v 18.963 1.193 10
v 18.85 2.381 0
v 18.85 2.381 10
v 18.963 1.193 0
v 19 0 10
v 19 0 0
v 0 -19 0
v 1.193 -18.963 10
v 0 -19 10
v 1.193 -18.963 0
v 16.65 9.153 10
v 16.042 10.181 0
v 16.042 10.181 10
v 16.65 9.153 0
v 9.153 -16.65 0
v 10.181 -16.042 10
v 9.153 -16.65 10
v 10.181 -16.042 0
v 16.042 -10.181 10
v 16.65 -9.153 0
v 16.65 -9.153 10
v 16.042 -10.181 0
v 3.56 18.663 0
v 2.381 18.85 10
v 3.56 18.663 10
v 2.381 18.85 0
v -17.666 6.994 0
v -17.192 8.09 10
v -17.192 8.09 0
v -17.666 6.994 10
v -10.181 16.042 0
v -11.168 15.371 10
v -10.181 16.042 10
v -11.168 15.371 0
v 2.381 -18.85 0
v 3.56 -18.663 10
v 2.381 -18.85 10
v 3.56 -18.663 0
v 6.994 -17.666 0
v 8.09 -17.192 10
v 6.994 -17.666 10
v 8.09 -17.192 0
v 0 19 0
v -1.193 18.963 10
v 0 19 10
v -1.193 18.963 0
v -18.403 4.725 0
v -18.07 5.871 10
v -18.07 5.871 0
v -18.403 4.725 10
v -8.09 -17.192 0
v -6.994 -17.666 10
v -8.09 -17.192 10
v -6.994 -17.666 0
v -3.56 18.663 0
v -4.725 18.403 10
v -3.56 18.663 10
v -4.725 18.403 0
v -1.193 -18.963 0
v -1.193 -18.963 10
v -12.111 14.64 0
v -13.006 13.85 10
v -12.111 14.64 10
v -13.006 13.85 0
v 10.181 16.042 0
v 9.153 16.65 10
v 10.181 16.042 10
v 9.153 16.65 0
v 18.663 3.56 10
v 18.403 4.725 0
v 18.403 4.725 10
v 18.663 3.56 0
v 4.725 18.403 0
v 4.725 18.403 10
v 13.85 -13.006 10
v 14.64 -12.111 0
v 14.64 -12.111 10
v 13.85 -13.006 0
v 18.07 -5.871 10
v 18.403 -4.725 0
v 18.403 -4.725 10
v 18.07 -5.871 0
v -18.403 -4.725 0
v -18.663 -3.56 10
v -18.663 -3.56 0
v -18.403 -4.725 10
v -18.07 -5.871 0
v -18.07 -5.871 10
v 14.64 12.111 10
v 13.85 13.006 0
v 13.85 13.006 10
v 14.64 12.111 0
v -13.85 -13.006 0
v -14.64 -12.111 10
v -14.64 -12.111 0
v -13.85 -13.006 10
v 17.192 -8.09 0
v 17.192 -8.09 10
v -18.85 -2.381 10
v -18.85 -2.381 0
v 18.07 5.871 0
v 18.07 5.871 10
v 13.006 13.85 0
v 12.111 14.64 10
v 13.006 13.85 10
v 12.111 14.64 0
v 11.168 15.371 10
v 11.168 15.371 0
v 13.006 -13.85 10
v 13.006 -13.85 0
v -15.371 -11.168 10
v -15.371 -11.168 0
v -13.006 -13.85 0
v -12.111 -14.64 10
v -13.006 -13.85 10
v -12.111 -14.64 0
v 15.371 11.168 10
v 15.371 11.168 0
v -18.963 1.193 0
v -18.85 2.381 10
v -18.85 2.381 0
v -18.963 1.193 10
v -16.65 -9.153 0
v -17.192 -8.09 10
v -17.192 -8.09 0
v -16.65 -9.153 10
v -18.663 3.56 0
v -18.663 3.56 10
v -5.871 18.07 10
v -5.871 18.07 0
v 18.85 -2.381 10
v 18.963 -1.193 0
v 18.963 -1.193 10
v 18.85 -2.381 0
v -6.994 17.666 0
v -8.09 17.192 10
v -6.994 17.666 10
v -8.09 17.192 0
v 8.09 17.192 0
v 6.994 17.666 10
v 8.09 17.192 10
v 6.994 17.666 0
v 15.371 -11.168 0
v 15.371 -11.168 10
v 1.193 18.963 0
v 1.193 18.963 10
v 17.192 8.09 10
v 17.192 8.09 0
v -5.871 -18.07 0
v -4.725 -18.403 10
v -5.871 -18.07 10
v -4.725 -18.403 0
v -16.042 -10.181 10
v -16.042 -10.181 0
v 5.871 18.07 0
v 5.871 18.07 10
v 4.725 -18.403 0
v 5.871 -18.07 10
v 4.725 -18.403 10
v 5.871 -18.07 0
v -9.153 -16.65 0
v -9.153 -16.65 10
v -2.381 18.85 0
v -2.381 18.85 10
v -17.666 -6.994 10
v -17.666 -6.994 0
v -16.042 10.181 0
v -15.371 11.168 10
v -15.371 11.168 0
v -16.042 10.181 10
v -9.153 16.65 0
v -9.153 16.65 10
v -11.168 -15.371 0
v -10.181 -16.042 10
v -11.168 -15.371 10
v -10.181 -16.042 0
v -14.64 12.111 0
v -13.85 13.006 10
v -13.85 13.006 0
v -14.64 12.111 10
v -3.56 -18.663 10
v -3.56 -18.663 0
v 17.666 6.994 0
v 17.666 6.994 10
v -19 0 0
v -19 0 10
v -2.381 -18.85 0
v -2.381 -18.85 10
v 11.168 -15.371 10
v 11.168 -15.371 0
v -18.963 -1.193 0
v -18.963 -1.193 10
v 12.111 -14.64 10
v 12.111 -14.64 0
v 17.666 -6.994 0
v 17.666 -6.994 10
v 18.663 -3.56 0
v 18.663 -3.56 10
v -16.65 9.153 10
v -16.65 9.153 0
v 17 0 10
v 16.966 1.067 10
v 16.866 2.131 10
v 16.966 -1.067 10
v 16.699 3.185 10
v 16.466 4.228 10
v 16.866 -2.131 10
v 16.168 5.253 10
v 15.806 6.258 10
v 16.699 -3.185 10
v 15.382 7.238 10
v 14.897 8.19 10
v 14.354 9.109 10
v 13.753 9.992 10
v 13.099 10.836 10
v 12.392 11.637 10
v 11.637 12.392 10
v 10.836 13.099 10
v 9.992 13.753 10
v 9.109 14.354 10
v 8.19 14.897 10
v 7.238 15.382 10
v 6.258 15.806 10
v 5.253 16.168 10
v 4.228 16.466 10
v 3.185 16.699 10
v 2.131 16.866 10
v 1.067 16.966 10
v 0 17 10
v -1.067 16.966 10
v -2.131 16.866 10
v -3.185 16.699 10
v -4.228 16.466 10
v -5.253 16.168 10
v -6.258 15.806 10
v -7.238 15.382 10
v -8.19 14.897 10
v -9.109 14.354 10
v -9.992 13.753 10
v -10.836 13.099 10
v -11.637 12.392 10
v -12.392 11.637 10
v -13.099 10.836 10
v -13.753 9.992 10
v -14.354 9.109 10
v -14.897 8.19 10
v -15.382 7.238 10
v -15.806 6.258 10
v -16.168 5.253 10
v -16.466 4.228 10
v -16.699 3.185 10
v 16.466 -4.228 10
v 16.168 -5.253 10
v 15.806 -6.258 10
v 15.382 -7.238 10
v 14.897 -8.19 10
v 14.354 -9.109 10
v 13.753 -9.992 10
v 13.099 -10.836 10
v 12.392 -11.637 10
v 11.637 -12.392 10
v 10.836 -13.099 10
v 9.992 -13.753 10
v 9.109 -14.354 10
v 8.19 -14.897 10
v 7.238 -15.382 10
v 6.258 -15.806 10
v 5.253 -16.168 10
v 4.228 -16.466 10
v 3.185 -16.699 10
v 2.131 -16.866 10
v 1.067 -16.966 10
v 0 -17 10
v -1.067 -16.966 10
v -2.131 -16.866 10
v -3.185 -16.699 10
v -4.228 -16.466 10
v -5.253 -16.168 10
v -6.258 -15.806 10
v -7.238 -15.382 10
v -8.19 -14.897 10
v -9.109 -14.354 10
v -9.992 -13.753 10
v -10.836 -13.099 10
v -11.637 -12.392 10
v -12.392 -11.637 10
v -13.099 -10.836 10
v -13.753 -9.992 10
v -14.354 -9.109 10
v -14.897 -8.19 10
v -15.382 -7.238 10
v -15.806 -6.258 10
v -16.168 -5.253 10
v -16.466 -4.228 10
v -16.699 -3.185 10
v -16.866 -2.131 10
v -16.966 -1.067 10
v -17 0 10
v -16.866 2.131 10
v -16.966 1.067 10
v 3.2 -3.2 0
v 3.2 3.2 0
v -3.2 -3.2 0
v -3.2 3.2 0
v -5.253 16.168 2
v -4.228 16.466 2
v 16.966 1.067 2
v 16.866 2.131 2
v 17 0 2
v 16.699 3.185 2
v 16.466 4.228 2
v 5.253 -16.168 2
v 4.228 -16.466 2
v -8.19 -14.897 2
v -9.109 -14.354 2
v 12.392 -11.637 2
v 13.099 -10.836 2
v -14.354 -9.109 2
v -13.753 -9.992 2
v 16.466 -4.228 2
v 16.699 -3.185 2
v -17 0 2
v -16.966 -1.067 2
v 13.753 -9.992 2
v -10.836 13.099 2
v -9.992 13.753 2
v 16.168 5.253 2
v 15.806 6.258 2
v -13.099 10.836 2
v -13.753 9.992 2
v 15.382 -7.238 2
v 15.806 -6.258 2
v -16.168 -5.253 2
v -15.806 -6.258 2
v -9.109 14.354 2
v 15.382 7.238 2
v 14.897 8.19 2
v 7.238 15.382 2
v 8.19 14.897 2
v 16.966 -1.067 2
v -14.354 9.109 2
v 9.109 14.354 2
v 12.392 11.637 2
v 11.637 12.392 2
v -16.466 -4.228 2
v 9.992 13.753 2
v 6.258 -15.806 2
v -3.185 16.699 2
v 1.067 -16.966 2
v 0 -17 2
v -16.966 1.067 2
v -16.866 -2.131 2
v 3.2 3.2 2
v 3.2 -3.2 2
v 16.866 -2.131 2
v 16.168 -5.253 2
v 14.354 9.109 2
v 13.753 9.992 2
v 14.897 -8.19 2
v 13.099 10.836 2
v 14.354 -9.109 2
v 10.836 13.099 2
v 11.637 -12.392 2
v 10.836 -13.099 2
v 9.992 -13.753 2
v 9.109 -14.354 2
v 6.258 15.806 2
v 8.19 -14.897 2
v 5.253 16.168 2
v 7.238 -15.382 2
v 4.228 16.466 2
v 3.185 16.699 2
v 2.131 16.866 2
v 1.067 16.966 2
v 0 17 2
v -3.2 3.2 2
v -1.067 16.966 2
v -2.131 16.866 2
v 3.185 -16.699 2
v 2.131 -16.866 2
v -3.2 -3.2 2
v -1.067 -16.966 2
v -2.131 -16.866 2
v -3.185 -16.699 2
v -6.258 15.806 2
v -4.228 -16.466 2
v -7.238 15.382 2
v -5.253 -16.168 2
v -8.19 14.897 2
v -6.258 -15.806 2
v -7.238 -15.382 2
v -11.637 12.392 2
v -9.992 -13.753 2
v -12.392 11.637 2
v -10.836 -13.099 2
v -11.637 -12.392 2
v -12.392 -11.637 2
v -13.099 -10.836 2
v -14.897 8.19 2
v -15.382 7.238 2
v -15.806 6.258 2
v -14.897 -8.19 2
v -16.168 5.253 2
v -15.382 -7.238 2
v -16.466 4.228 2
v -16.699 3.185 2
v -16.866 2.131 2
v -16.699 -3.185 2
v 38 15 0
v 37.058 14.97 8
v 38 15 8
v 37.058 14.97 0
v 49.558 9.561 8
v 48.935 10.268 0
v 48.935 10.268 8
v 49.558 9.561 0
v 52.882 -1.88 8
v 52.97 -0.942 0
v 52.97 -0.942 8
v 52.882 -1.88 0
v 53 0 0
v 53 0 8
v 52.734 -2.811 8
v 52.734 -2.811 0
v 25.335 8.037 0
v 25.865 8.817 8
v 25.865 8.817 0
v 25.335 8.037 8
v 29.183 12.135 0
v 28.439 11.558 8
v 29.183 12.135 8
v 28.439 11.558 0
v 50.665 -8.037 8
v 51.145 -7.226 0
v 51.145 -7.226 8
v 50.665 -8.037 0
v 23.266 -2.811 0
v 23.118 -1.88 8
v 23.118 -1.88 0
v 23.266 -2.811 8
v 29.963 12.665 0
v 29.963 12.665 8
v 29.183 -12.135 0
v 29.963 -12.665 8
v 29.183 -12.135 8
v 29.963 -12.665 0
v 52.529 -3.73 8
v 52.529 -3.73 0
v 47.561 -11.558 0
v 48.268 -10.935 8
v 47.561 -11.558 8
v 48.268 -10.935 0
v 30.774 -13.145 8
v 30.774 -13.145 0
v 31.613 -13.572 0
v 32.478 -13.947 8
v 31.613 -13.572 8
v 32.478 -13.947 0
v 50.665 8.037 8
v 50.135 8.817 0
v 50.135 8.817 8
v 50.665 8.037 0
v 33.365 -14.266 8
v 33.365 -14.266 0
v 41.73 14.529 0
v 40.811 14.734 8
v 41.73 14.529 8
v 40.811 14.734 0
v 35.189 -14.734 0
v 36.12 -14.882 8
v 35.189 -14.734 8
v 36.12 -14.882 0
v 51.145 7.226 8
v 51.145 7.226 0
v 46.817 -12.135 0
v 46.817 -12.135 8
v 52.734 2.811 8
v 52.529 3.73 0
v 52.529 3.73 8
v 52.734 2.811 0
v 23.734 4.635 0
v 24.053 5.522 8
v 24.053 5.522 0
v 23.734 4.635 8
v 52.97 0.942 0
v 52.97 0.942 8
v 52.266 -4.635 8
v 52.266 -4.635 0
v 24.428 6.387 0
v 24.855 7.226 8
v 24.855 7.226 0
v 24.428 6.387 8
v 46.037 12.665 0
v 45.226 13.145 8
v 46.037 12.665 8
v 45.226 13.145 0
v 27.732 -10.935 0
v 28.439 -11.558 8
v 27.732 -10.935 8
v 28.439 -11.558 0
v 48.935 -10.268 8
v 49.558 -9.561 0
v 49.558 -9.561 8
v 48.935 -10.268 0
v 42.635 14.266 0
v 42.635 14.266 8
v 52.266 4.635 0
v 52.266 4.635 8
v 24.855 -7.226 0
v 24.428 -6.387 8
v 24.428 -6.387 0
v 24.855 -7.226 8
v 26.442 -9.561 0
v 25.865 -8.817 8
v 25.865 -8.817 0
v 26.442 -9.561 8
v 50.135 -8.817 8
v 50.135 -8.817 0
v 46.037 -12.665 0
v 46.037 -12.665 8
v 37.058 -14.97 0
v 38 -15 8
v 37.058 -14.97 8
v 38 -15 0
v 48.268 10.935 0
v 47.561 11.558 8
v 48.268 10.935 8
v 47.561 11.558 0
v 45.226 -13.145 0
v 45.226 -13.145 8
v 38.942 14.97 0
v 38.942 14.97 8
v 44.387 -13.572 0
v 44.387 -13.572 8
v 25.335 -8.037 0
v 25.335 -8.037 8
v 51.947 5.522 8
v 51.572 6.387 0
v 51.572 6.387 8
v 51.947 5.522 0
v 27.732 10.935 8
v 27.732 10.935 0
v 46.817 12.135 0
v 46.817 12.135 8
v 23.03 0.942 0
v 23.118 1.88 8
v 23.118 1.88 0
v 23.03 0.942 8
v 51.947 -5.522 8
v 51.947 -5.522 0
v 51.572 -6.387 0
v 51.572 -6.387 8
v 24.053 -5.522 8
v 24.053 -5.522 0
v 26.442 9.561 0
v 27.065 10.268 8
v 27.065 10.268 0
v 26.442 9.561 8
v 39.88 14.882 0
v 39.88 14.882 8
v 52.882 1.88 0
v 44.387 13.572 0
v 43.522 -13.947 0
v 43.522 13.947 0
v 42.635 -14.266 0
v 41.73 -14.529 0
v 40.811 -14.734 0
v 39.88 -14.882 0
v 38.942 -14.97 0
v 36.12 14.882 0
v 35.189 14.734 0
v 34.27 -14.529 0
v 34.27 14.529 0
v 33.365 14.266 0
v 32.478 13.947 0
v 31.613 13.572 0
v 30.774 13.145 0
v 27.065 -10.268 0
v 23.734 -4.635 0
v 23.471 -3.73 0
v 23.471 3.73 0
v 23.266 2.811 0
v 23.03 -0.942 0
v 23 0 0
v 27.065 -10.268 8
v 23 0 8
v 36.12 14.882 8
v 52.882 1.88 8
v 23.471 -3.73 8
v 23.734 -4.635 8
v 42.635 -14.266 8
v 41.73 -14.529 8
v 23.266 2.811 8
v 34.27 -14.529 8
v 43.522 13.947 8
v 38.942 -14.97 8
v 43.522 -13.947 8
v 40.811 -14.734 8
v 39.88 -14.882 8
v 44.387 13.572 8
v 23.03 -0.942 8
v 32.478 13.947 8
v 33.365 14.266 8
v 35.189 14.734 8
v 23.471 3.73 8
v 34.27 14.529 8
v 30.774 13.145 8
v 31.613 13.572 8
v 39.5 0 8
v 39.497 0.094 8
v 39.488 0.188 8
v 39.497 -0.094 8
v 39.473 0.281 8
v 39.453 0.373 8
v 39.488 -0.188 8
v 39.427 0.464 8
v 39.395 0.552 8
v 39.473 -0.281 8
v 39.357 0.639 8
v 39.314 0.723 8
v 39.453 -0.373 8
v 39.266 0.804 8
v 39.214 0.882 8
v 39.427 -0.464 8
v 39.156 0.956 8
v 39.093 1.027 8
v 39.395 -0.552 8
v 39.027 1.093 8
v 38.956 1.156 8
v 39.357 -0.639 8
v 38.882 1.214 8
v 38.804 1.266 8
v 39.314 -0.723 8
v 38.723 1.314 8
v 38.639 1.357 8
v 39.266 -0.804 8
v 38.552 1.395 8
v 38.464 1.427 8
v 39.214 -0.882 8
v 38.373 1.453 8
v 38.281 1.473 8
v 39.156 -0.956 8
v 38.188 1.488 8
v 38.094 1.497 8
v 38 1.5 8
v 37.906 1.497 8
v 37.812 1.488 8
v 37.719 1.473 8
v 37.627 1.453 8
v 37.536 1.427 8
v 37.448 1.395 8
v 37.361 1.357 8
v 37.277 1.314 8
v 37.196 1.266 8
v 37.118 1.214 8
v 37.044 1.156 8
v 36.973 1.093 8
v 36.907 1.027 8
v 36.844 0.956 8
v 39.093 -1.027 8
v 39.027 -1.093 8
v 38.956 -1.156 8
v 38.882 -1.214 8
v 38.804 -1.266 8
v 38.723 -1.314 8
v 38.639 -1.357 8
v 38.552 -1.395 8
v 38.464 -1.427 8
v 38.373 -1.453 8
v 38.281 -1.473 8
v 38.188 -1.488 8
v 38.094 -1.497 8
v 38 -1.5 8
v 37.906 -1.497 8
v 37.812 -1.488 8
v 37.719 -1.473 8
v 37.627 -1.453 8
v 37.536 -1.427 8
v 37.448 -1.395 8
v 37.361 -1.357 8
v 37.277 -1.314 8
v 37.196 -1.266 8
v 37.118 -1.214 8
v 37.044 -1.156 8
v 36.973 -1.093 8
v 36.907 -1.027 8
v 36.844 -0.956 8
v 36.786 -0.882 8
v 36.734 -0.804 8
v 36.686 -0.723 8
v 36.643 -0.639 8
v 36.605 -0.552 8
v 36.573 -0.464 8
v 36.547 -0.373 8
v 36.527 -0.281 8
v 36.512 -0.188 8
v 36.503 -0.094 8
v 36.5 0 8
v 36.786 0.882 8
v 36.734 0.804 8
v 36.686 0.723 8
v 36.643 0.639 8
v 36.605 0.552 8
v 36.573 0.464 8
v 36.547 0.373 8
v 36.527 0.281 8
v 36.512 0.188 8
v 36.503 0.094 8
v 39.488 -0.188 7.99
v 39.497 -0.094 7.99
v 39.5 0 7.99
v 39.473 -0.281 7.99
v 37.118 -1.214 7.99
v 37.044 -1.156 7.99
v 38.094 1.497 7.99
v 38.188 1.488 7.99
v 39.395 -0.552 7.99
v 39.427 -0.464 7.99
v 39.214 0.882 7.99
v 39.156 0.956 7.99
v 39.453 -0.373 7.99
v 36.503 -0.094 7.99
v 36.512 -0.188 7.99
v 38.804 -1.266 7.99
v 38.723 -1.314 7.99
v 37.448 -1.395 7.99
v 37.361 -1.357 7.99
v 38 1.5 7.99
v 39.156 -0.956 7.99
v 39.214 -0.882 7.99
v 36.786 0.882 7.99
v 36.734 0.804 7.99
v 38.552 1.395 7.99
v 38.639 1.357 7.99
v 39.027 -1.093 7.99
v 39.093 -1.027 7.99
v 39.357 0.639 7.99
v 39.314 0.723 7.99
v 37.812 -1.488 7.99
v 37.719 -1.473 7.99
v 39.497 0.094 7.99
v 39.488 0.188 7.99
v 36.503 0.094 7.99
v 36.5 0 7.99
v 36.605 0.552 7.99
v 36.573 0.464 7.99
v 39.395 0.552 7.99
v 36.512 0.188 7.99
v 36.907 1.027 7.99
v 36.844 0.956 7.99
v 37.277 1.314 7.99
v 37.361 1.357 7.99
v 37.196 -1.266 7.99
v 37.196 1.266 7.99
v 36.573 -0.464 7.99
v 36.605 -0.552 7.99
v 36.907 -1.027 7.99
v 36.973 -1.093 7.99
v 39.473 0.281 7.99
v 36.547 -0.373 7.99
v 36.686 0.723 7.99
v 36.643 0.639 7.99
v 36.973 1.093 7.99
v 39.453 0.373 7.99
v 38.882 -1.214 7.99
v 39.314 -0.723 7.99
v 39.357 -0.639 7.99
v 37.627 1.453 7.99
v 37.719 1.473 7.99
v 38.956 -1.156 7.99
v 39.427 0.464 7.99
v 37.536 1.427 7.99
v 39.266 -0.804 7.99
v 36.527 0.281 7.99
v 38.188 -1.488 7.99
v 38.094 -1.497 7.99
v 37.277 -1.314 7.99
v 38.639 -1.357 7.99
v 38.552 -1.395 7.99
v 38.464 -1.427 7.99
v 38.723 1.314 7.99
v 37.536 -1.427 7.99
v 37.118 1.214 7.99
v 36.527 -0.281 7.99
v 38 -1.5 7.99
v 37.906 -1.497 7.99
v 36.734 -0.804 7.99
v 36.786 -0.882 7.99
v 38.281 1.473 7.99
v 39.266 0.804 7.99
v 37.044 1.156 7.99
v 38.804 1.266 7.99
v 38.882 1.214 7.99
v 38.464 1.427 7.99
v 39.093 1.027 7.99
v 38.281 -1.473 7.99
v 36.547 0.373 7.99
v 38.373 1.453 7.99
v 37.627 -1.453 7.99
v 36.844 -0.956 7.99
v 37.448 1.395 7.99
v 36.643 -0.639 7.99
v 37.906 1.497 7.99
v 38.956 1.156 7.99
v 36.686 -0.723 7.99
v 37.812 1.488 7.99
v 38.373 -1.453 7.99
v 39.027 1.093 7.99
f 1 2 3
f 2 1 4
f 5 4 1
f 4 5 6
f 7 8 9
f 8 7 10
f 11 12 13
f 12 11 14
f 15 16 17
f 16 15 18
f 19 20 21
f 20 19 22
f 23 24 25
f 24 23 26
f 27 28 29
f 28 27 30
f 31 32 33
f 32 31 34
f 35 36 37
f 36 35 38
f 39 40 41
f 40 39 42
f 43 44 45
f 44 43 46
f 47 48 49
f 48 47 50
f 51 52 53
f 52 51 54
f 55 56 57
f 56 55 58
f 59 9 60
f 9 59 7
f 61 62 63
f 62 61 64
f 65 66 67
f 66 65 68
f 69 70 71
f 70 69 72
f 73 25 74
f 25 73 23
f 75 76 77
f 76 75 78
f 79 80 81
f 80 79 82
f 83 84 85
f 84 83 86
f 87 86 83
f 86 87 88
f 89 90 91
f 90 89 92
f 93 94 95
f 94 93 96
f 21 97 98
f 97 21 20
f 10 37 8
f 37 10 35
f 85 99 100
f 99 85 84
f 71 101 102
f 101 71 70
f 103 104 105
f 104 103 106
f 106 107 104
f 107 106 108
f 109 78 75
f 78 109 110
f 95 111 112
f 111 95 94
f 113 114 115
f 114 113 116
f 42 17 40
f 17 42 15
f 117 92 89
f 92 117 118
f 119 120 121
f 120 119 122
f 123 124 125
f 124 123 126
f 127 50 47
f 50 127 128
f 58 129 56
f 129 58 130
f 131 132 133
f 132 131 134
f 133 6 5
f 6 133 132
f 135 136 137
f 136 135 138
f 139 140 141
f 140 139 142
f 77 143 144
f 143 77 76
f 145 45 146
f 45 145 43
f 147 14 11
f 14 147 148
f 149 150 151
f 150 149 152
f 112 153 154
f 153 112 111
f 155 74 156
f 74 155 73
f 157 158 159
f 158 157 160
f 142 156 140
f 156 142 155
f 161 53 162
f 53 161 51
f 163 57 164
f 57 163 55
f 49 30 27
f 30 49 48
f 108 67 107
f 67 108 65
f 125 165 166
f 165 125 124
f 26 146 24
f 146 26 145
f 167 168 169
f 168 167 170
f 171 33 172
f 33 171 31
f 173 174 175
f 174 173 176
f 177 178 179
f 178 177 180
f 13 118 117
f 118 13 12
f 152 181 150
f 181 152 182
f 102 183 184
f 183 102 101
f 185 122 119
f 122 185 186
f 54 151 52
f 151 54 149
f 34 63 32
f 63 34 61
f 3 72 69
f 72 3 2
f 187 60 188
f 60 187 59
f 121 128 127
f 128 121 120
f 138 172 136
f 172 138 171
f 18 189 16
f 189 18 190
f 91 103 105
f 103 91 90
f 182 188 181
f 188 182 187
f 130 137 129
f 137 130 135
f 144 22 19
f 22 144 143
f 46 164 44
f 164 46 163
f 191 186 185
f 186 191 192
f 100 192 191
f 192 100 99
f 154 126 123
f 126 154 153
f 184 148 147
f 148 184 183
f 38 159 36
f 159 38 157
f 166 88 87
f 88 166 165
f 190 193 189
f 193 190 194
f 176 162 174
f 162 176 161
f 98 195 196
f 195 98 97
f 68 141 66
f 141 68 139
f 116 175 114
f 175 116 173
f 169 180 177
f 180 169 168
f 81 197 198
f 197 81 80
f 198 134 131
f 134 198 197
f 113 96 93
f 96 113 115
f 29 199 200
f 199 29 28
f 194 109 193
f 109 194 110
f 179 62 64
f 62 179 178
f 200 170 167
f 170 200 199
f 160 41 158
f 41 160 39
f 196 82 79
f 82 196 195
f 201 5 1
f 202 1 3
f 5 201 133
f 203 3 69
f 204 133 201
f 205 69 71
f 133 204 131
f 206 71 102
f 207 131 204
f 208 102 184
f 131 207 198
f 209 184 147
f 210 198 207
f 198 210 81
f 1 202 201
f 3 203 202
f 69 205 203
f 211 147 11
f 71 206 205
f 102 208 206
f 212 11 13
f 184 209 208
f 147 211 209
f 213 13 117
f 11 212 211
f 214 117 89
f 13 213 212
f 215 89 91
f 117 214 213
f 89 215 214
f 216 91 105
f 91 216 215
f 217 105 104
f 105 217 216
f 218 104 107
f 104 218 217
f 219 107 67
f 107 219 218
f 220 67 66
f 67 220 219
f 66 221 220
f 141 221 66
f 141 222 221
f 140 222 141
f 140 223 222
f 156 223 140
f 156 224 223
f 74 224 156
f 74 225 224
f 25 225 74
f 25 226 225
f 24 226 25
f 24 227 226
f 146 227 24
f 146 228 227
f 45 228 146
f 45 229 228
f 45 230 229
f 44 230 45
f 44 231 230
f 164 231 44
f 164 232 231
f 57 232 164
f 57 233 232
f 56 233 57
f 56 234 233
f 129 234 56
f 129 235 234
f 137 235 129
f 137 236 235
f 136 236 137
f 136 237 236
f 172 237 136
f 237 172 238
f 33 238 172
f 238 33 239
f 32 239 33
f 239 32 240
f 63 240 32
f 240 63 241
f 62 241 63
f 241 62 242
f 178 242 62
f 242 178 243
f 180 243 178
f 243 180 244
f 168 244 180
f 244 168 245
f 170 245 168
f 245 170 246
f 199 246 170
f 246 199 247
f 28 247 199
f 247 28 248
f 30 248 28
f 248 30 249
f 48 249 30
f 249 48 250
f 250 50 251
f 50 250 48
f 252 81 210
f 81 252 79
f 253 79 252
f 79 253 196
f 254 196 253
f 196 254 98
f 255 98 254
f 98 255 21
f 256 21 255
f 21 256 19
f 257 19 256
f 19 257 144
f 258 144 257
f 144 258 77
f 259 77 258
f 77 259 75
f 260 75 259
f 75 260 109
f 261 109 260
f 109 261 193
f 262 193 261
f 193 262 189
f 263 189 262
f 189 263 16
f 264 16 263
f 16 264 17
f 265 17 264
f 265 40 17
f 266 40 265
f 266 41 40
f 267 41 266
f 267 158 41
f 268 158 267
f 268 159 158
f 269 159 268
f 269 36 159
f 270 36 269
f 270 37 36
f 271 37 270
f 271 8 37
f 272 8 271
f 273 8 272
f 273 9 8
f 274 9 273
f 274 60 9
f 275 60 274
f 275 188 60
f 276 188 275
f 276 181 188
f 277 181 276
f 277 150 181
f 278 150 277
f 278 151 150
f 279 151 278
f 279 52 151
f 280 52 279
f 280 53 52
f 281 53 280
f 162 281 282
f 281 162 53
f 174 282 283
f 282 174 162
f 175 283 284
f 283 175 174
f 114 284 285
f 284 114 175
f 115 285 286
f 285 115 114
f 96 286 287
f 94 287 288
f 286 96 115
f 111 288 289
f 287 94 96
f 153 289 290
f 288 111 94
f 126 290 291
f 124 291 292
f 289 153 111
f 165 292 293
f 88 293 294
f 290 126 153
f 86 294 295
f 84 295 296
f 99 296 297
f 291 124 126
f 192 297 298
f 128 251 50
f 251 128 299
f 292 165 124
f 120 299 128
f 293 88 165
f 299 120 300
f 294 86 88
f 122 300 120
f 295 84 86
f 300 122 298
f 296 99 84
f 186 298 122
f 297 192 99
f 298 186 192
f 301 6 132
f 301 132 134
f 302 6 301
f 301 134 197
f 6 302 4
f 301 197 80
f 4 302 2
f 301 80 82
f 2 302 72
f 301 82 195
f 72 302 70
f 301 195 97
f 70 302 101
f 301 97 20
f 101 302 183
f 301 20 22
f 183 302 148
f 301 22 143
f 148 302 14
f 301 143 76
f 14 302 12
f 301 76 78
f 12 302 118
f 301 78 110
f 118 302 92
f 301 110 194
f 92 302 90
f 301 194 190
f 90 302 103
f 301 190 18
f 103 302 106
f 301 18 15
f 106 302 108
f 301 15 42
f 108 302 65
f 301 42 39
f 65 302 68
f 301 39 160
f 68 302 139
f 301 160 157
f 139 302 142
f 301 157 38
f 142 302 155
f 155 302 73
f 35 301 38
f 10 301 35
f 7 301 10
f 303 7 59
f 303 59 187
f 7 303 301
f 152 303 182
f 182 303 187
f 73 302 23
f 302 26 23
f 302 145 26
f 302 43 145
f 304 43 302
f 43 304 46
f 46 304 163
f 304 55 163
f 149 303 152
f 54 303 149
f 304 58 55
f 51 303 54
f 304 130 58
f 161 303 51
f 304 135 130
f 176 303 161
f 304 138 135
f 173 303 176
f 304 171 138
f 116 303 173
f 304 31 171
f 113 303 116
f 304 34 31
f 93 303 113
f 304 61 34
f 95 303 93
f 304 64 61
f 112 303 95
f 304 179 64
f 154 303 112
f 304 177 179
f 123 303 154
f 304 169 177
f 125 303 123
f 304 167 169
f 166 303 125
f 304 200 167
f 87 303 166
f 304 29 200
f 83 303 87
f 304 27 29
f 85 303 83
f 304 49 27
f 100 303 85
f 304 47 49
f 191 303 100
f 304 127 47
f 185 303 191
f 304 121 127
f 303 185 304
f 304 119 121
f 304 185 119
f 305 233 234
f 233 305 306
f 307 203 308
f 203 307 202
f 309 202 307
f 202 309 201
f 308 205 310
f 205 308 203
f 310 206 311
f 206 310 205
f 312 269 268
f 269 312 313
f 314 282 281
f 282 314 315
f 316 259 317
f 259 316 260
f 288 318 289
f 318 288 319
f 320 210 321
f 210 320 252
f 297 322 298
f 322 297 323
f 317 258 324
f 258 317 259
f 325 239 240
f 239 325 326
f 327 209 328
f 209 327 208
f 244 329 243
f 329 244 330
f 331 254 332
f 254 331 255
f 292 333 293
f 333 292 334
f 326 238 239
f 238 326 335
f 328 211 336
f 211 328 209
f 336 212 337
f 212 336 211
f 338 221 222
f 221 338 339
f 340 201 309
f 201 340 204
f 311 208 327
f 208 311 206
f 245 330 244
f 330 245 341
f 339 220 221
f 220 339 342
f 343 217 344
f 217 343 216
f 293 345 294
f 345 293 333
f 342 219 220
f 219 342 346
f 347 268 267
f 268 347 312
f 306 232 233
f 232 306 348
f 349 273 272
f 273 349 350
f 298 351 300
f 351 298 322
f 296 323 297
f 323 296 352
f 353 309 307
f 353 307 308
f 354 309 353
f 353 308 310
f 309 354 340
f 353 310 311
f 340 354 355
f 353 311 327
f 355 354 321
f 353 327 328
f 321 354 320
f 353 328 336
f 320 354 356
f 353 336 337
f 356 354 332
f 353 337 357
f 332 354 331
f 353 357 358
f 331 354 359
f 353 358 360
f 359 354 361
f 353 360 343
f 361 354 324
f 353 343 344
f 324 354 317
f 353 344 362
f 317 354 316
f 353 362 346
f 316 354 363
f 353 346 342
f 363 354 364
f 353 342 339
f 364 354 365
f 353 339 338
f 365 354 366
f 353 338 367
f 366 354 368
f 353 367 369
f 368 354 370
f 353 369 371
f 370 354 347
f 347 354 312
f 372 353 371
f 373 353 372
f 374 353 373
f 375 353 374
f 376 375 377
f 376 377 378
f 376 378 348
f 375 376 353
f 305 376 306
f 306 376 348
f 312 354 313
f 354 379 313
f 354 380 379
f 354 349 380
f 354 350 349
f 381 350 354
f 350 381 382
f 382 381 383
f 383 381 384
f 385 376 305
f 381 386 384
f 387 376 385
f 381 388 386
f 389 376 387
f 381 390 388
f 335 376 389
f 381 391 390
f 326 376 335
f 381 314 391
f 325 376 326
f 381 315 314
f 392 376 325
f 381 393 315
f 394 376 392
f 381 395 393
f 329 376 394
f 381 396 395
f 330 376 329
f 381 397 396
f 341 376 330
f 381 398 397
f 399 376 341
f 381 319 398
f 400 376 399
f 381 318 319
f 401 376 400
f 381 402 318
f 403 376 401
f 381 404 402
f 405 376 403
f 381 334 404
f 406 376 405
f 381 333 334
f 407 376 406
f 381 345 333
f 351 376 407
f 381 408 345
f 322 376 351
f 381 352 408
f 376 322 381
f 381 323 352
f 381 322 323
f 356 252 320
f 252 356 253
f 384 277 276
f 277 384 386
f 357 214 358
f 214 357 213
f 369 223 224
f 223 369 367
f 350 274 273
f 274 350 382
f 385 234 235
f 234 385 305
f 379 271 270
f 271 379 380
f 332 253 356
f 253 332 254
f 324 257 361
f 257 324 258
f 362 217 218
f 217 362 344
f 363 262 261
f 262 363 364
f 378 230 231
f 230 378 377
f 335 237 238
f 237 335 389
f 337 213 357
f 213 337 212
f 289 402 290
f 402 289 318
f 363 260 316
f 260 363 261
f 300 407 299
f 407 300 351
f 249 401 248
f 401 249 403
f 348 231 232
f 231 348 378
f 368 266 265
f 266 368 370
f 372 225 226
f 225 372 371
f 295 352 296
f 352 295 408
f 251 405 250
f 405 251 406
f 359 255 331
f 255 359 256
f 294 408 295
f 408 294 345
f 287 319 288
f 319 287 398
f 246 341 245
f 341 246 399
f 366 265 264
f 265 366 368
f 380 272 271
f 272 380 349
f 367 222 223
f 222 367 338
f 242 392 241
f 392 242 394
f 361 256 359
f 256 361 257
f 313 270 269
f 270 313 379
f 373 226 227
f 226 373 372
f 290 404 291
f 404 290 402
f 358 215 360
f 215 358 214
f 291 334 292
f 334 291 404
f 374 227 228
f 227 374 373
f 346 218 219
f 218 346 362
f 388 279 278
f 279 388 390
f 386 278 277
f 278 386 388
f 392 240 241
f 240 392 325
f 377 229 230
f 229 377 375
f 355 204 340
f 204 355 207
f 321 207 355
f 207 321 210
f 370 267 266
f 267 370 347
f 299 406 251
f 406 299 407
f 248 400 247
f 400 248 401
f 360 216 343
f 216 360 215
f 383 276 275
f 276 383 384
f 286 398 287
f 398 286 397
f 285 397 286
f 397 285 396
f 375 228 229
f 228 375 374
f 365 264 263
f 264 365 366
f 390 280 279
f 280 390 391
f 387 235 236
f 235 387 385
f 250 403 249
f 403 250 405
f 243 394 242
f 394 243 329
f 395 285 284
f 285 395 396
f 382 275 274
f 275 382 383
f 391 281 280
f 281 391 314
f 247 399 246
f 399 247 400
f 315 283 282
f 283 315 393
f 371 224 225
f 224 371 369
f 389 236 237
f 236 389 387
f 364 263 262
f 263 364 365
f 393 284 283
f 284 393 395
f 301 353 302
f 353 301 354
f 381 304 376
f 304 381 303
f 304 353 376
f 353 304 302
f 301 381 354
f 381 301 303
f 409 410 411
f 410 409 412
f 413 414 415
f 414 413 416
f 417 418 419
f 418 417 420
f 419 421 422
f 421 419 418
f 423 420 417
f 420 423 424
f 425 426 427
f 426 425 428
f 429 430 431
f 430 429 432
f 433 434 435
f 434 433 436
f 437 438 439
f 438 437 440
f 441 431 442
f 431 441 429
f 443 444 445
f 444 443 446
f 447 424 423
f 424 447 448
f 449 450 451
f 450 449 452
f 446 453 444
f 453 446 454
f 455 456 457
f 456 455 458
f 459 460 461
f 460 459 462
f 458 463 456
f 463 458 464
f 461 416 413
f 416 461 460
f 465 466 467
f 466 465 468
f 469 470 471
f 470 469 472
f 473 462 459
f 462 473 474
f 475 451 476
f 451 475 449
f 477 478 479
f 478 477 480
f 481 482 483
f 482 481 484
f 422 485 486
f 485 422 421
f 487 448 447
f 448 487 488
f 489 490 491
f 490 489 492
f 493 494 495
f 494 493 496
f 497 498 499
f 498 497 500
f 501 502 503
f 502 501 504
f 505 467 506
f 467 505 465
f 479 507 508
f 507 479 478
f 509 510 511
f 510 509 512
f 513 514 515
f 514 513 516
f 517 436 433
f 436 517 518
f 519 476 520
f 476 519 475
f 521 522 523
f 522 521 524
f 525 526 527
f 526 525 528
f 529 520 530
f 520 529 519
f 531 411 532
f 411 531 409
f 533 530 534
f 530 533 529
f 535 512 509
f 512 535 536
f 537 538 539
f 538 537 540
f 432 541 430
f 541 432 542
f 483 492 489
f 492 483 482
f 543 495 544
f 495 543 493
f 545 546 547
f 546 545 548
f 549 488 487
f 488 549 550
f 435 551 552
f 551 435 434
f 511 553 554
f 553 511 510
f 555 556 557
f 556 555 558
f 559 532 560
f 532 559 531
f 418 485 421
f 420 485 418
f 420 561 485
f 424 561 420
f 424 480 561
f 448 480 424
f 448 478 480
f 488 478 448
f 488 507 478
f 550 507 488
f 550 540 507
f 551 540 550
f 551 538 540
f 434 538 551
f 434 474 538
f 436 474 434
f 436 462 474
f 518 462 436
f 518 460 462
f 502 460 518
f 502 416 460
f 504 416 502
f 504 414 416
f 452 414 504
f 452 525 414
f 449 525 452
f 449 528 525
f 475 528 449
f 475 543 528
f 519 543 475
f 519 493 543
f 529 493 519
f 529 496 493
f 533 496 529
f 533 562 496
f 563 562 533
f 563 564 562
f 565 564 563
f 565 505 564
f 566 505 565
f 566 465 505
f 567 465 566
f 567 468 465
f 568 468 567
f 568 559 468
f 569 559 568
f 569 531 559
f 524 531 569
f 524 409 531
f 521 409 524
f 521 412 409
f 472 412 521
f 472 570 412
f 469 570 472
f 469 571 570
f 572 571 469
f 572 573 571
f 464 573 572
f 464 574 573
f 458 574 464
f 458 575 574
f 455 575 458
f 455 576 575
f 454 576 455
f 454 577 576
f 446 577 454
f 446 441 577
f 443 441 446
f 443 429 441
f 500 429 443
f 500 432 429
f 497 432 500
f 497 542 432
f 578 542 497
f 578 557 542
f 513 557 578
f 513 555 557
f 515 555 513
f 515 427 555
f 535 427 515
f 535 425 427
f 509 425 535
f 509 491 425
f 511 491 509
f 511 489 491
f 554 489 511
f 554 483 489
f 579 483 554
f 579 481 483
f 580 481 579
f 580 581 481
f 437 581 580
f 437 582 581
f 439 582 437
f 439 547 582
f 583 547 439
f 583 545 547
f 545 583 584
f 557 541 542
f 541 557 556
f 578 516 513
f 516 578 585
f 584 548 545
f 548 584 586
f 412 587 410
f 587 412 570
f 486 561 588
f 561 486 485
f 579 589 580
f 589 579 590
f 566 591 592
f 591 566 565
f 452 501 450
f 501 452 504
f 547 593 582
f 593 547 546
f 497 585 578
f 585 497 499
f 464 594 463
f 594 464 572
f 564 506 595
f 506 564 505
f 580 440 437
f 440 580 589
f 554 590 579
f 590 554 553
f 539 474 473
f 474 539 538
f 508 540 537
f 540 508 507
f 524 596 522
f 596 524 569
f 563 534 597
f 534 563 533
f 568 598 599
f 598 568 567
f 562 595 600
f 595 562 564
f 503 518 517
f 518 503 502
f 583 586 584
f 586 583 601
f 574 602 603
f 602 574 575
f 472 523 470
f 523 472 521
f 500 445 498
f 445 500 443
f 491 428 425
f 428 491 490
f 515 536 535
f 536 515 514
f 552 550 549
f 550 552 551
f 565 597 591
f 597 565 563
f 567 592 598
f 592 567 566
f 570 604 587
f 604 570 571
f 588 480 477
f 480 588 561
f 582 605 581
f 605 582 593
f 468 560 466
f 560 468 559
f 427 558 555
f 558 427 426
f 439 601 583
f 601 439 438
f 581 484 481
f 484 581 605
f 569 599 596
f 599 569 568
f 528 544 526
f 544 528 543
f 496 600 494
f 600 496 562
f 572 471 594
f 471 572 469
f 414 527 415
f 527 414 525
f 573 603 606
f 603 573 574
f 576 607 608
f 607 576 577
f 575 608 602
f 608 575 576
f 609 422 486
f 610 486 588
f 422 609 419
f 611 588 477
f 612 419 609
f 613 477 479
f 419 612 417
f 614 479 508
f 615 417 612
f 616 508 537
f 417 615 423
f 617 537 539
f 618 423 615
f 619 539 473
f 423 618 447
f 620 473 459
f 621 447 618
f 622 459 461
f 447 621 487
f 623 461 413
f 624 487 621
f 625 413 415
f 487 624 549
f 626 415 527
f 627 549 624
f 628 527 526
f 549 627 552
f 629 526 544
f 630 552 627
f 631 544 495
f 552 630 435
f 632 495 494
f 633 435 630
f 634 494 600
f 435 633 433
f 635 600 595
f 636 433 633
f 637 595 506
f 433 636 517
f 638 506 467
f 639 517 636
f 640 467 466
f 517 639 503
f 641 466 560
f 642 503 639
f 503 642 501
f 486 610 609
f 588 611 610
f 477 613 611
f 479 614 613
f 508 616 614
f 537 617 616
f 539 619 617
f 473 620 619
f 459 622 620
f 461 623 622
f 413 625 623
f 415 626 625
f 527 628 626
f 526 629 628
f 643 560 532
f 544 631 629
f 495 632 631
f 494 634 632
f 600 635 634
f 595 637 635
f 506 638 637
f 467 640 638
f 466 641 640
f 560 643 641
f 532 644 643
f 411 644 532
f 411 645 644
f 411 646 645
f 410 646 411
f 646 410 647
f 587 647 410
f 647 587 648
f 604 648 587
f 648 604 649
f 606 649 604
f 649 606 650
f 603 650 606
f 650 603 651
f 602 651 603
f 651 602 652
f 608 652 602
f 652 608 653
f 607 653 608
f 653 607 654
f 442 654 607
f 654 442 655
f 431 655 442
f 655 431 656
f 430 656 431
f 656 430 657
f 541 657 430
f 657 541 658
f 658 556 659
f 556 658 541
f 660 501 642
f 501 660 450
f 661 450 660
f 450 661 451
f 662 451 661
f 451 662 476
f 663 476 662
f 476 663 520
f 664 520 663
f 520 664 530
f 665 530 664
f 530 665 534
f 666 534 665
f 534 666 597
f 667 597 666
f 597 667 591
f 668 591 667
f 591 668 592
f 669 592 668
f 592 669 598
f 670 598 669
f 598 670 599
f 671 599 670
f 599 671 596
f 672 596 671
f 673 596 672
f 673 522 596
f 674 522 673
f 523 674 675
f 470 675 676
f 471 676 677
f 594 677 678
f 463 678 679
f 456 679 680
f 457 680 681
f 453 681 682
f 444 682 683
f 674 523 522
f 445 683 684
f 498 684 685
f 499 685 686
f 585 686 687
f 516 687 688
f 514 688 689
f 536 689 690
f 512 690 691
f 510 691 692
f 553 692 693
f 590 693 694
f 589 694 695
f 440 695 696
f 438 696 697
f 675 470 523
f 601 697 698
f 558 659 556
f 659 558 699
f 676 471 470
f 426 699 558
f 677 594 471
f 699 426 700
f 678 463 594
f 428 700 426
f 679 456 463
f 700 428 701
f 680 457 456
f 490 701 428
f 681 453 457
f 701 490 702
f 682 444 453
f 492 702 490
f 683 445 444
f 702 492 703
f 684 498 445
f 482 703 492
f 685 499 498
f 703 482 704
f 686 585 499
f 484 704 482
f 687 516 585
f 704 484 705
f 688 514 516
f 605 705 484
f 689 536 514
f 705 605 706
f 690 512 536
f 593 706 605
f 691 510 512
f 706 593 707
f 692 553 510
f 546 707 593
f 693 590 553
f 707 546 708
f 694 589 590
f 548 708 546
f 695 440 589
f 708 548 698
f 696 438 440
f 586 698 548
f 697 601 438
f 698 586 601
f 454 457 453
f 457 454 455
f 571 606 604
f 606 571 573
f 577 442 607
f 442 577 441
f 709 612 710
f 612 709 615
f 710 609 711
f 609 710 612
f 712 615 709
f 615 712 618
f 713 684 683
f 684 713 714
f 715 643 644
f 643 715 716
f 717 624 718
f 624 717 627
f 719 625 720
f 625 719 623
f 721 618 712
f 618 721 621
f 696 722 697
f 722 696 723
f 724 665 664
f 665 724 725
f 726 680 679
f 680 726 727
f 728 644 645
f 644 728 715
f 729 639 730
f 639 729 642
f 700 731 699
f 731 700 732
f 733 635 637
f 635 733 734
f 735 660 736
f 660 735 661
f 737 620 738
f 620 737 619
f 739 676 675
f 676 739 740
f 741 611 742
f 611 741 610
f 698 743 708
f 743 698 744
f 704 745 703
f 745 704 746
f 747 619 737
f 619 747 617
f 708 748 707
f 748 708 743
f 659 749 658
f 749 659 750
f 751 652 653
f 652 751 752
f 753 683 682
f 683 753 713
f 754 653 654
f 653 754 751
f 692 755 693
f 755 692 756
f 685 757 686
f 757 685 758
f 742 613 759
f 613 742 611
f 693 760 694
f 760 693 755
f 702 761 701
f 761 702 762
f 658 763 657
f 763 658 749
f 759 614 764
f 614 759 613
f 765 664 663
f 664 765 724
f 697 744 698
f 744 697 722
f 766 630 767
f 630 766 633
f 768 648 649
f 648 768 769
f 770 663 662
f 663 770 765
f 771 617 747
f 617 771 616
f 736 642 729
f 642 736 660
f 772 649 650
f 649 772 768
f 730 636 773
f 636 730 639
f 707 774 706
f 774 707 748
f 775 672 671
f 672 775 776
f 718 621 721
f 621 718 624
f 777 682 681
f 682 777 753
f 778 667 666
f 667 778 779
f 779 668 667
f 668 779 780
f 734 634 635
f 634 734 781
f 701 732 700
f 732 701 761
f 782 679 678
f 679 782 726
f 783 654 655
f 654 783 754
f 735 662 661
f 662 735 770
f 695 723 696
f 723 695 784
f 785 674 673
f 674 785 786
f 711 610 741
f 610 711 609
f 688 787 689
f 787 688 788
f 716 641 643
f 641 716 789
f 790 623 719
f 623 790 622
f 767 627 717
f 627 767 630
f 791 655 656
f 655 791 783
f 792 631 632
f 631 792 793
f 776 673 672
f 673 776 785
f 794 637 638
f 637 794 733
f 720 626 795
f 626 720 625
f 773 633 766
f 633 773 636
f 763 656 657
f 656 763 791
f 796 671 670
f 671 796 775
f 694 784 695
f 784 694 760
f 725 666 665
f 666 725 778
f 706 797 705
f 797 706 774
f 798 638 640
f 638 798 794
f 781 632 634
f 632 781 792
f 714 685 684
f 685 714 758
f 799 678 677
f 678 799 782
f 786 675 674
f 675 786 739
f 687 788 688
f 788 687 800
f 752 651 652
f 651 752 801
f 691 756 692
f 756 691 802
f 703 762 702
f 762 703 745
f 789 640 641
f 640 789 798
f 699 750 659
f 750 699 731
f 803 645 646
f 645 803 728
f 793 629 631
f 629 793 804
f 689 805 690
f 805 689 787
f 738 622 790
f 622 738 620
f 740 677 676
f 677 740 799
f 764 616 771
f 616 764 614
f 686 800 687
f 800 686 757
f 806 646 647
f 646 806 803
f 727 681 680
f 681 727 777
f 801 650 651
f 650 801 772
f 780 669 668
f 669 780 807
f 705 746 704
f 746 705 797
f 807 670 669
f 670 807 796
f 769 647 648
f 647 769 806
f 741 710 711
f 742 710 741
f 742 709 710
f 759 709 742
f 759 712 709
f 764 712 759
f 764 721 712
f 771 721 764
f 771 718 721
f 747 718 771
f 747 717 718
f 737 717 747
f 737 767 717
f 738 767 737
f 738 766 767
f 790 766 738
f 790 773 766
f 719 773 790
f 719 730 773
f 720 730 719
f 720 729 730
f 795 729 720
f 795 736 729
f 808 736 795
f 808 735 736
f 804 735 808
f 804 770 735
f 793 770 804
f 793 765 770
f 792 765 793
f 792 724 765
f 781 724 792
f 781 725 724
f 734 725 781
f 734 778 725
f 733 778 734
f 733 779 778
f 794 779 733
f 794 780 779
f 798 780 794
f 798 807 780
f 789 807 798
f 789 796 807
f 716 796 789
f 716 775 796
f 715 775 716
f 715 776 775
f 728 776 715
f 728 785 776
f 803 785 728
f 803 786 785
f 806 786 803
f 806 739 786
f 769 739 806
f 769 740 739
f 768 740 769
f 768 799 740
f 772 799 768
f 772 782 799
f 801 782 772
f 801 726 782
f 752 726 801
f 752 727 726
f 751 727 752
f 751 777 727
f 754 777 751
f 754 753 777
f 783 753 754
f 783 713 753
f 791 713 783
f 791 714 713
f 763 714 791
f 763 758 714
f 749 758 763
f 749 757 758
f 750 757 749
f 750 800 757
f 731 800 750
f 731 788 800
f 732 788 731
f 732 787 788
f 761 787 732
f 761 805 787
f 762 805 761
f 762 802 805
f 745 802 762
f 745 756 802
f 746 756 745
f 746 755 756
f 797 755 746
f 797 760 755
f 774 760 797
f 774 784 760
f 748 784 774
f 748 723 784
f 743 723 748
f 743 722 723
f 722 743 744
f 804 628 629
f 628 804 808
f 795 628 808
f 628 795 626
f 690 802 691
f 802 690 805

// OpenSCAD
// 3D Printed Tactile Switch Adapter
// Creates a large button and holder for a small tactile switch.
// Kyle Mathewson - Voice2Print Project

// ==== GLOBAL CONFIGURATION ====
$fn = 100; // Increase for smoother circles

// ==== TACTILE SWITCH DIMENSIONS (to be customized by user) ====
switch_width = 6;      // Width of the tactile switch body (e.g., 6mm for a 6x6mm switch)
switch_length = 6;     // Length of the tactile switch body
switch_height = 5;     // Height of the tactile switch body (excluding plunger)
switch_plunger_height = 2; // Height of the switch's own button/plunger
switch_plunger_diameter = 3; // Diameter of the switch's plunger

// ==== CUSTOM BUTTON DIMENSIONS ====
button_diameter = 30;  // Diameter of the large button cap
button_height = 8;     // Height of the large button cap
button_plunger_extension = 3; // How far the plunger extends from the button's underside

// ==== HOLDER DIMENSIONS ====
holder_diameter = button_diameter + 8; // Diameter of the holder base
holder_height = switch_height + 5;     // Total height of the holder
wall_thickness = 2;                  // Wall thickness for the holder

// ==== TOLERANCES ====
tolerance = 0.4; // Clearance for parts to fit together

// ==== COLORS FOR VISUALIZATION ====
button_color = "SteelBlue";
holder_color = "Silver";
switch_color = "Black";

// ============== MODULE DEFINITIONS ==============

// --- Tactile Switch Model (for visualization) ---
module tactile_switch() {
    color(switch_color) {
        // Switch Body
        cube([switch_width, switch_length, switch_height], center=true);
        // Switch Plunger
        translate([0, 0, switch_height/2]) {
            cylinder(d=switch_plunger_diameter, h=switch_plunger_height, center=false);
        }
    }
}

// --- Switch Holder ---
module switch_holder() {
    difference() {
        // Main holder body
        cylinder(d=holder_diameter, h=holder_height);

        // Hollow out the inside for the button
        translate([0, 0, wall_thickness]) {
            cylinder(d=holder_diameter - wall_thickness*2, h=holder_height);
        }

        // Create opening for the button plunger
        cylinder(d=switch_plunger_diameter + tolerance, h=holder_height*2, center=true);

        // Cavity for the tactile switch at the bottom
        translate([0, 0, -0.01]) { // -0.01 to ensure cut
            cube([switch_width + tolerance, switch_length + tolerance, switch_height + tolerance], center=true);
        }

        // Opening at the bottom to insert the switch
        translate([0,0, -holder_height/2])
        cube([switch_width + tolerance, switch_length + tolerance, holder_height], center=true);

    }
}


// --- Large Button ---
module large_button() {
    difference() {
        // Main button cap
        cylinder(d=button_diameter, h=button_height);
        
        // Plunger that presses the switch
        translate([0, 0, -button_plunger_extension]) {
            cylinder(d=switch_plunger_diameter, h=button_plunger_extension + 0.01);
        }
    }
    // Add a chamfer for a nicer look and feel
    rotate_extrude(convexity=10) {
        translate([button_diameter/2, button_height, 0]) {
            polygon(points=[[0,0], [-1,0], [0,-1]]);
        }
    }
}

// ============== ASSEMBLY & PRINTING ==============

// --- Assembly View ---
module assembly() {
    // Holder
    color(holder_color, 0.7)
    translate([0, 0, 0]) {
        switch_holder();
    }

    // Button (in place, slightly raised)
    color(button_color)
    translate([0, 0, holder_height - button_height/2]) {
        large_button();
    }
    
    // Tactile switch inside the holder
    translate([0, 0, switch_height/2]) {
        tactile_switch();
    }
}

// --- Print Layout ---
module print_layout() {
    // Place holder flat on the bed
    switch_holder();

    // Place button next to it, top up
    translate([holder_diameter, 0, button_height]) {
        rotate([180, 0, 0])
            large_button();
    }
}


// ============== RENDER CONTROL ==============

// --- Uncomment the desired module to render ---

// assembly();
print_layout();
// switch_holder();
// large_button(); 
